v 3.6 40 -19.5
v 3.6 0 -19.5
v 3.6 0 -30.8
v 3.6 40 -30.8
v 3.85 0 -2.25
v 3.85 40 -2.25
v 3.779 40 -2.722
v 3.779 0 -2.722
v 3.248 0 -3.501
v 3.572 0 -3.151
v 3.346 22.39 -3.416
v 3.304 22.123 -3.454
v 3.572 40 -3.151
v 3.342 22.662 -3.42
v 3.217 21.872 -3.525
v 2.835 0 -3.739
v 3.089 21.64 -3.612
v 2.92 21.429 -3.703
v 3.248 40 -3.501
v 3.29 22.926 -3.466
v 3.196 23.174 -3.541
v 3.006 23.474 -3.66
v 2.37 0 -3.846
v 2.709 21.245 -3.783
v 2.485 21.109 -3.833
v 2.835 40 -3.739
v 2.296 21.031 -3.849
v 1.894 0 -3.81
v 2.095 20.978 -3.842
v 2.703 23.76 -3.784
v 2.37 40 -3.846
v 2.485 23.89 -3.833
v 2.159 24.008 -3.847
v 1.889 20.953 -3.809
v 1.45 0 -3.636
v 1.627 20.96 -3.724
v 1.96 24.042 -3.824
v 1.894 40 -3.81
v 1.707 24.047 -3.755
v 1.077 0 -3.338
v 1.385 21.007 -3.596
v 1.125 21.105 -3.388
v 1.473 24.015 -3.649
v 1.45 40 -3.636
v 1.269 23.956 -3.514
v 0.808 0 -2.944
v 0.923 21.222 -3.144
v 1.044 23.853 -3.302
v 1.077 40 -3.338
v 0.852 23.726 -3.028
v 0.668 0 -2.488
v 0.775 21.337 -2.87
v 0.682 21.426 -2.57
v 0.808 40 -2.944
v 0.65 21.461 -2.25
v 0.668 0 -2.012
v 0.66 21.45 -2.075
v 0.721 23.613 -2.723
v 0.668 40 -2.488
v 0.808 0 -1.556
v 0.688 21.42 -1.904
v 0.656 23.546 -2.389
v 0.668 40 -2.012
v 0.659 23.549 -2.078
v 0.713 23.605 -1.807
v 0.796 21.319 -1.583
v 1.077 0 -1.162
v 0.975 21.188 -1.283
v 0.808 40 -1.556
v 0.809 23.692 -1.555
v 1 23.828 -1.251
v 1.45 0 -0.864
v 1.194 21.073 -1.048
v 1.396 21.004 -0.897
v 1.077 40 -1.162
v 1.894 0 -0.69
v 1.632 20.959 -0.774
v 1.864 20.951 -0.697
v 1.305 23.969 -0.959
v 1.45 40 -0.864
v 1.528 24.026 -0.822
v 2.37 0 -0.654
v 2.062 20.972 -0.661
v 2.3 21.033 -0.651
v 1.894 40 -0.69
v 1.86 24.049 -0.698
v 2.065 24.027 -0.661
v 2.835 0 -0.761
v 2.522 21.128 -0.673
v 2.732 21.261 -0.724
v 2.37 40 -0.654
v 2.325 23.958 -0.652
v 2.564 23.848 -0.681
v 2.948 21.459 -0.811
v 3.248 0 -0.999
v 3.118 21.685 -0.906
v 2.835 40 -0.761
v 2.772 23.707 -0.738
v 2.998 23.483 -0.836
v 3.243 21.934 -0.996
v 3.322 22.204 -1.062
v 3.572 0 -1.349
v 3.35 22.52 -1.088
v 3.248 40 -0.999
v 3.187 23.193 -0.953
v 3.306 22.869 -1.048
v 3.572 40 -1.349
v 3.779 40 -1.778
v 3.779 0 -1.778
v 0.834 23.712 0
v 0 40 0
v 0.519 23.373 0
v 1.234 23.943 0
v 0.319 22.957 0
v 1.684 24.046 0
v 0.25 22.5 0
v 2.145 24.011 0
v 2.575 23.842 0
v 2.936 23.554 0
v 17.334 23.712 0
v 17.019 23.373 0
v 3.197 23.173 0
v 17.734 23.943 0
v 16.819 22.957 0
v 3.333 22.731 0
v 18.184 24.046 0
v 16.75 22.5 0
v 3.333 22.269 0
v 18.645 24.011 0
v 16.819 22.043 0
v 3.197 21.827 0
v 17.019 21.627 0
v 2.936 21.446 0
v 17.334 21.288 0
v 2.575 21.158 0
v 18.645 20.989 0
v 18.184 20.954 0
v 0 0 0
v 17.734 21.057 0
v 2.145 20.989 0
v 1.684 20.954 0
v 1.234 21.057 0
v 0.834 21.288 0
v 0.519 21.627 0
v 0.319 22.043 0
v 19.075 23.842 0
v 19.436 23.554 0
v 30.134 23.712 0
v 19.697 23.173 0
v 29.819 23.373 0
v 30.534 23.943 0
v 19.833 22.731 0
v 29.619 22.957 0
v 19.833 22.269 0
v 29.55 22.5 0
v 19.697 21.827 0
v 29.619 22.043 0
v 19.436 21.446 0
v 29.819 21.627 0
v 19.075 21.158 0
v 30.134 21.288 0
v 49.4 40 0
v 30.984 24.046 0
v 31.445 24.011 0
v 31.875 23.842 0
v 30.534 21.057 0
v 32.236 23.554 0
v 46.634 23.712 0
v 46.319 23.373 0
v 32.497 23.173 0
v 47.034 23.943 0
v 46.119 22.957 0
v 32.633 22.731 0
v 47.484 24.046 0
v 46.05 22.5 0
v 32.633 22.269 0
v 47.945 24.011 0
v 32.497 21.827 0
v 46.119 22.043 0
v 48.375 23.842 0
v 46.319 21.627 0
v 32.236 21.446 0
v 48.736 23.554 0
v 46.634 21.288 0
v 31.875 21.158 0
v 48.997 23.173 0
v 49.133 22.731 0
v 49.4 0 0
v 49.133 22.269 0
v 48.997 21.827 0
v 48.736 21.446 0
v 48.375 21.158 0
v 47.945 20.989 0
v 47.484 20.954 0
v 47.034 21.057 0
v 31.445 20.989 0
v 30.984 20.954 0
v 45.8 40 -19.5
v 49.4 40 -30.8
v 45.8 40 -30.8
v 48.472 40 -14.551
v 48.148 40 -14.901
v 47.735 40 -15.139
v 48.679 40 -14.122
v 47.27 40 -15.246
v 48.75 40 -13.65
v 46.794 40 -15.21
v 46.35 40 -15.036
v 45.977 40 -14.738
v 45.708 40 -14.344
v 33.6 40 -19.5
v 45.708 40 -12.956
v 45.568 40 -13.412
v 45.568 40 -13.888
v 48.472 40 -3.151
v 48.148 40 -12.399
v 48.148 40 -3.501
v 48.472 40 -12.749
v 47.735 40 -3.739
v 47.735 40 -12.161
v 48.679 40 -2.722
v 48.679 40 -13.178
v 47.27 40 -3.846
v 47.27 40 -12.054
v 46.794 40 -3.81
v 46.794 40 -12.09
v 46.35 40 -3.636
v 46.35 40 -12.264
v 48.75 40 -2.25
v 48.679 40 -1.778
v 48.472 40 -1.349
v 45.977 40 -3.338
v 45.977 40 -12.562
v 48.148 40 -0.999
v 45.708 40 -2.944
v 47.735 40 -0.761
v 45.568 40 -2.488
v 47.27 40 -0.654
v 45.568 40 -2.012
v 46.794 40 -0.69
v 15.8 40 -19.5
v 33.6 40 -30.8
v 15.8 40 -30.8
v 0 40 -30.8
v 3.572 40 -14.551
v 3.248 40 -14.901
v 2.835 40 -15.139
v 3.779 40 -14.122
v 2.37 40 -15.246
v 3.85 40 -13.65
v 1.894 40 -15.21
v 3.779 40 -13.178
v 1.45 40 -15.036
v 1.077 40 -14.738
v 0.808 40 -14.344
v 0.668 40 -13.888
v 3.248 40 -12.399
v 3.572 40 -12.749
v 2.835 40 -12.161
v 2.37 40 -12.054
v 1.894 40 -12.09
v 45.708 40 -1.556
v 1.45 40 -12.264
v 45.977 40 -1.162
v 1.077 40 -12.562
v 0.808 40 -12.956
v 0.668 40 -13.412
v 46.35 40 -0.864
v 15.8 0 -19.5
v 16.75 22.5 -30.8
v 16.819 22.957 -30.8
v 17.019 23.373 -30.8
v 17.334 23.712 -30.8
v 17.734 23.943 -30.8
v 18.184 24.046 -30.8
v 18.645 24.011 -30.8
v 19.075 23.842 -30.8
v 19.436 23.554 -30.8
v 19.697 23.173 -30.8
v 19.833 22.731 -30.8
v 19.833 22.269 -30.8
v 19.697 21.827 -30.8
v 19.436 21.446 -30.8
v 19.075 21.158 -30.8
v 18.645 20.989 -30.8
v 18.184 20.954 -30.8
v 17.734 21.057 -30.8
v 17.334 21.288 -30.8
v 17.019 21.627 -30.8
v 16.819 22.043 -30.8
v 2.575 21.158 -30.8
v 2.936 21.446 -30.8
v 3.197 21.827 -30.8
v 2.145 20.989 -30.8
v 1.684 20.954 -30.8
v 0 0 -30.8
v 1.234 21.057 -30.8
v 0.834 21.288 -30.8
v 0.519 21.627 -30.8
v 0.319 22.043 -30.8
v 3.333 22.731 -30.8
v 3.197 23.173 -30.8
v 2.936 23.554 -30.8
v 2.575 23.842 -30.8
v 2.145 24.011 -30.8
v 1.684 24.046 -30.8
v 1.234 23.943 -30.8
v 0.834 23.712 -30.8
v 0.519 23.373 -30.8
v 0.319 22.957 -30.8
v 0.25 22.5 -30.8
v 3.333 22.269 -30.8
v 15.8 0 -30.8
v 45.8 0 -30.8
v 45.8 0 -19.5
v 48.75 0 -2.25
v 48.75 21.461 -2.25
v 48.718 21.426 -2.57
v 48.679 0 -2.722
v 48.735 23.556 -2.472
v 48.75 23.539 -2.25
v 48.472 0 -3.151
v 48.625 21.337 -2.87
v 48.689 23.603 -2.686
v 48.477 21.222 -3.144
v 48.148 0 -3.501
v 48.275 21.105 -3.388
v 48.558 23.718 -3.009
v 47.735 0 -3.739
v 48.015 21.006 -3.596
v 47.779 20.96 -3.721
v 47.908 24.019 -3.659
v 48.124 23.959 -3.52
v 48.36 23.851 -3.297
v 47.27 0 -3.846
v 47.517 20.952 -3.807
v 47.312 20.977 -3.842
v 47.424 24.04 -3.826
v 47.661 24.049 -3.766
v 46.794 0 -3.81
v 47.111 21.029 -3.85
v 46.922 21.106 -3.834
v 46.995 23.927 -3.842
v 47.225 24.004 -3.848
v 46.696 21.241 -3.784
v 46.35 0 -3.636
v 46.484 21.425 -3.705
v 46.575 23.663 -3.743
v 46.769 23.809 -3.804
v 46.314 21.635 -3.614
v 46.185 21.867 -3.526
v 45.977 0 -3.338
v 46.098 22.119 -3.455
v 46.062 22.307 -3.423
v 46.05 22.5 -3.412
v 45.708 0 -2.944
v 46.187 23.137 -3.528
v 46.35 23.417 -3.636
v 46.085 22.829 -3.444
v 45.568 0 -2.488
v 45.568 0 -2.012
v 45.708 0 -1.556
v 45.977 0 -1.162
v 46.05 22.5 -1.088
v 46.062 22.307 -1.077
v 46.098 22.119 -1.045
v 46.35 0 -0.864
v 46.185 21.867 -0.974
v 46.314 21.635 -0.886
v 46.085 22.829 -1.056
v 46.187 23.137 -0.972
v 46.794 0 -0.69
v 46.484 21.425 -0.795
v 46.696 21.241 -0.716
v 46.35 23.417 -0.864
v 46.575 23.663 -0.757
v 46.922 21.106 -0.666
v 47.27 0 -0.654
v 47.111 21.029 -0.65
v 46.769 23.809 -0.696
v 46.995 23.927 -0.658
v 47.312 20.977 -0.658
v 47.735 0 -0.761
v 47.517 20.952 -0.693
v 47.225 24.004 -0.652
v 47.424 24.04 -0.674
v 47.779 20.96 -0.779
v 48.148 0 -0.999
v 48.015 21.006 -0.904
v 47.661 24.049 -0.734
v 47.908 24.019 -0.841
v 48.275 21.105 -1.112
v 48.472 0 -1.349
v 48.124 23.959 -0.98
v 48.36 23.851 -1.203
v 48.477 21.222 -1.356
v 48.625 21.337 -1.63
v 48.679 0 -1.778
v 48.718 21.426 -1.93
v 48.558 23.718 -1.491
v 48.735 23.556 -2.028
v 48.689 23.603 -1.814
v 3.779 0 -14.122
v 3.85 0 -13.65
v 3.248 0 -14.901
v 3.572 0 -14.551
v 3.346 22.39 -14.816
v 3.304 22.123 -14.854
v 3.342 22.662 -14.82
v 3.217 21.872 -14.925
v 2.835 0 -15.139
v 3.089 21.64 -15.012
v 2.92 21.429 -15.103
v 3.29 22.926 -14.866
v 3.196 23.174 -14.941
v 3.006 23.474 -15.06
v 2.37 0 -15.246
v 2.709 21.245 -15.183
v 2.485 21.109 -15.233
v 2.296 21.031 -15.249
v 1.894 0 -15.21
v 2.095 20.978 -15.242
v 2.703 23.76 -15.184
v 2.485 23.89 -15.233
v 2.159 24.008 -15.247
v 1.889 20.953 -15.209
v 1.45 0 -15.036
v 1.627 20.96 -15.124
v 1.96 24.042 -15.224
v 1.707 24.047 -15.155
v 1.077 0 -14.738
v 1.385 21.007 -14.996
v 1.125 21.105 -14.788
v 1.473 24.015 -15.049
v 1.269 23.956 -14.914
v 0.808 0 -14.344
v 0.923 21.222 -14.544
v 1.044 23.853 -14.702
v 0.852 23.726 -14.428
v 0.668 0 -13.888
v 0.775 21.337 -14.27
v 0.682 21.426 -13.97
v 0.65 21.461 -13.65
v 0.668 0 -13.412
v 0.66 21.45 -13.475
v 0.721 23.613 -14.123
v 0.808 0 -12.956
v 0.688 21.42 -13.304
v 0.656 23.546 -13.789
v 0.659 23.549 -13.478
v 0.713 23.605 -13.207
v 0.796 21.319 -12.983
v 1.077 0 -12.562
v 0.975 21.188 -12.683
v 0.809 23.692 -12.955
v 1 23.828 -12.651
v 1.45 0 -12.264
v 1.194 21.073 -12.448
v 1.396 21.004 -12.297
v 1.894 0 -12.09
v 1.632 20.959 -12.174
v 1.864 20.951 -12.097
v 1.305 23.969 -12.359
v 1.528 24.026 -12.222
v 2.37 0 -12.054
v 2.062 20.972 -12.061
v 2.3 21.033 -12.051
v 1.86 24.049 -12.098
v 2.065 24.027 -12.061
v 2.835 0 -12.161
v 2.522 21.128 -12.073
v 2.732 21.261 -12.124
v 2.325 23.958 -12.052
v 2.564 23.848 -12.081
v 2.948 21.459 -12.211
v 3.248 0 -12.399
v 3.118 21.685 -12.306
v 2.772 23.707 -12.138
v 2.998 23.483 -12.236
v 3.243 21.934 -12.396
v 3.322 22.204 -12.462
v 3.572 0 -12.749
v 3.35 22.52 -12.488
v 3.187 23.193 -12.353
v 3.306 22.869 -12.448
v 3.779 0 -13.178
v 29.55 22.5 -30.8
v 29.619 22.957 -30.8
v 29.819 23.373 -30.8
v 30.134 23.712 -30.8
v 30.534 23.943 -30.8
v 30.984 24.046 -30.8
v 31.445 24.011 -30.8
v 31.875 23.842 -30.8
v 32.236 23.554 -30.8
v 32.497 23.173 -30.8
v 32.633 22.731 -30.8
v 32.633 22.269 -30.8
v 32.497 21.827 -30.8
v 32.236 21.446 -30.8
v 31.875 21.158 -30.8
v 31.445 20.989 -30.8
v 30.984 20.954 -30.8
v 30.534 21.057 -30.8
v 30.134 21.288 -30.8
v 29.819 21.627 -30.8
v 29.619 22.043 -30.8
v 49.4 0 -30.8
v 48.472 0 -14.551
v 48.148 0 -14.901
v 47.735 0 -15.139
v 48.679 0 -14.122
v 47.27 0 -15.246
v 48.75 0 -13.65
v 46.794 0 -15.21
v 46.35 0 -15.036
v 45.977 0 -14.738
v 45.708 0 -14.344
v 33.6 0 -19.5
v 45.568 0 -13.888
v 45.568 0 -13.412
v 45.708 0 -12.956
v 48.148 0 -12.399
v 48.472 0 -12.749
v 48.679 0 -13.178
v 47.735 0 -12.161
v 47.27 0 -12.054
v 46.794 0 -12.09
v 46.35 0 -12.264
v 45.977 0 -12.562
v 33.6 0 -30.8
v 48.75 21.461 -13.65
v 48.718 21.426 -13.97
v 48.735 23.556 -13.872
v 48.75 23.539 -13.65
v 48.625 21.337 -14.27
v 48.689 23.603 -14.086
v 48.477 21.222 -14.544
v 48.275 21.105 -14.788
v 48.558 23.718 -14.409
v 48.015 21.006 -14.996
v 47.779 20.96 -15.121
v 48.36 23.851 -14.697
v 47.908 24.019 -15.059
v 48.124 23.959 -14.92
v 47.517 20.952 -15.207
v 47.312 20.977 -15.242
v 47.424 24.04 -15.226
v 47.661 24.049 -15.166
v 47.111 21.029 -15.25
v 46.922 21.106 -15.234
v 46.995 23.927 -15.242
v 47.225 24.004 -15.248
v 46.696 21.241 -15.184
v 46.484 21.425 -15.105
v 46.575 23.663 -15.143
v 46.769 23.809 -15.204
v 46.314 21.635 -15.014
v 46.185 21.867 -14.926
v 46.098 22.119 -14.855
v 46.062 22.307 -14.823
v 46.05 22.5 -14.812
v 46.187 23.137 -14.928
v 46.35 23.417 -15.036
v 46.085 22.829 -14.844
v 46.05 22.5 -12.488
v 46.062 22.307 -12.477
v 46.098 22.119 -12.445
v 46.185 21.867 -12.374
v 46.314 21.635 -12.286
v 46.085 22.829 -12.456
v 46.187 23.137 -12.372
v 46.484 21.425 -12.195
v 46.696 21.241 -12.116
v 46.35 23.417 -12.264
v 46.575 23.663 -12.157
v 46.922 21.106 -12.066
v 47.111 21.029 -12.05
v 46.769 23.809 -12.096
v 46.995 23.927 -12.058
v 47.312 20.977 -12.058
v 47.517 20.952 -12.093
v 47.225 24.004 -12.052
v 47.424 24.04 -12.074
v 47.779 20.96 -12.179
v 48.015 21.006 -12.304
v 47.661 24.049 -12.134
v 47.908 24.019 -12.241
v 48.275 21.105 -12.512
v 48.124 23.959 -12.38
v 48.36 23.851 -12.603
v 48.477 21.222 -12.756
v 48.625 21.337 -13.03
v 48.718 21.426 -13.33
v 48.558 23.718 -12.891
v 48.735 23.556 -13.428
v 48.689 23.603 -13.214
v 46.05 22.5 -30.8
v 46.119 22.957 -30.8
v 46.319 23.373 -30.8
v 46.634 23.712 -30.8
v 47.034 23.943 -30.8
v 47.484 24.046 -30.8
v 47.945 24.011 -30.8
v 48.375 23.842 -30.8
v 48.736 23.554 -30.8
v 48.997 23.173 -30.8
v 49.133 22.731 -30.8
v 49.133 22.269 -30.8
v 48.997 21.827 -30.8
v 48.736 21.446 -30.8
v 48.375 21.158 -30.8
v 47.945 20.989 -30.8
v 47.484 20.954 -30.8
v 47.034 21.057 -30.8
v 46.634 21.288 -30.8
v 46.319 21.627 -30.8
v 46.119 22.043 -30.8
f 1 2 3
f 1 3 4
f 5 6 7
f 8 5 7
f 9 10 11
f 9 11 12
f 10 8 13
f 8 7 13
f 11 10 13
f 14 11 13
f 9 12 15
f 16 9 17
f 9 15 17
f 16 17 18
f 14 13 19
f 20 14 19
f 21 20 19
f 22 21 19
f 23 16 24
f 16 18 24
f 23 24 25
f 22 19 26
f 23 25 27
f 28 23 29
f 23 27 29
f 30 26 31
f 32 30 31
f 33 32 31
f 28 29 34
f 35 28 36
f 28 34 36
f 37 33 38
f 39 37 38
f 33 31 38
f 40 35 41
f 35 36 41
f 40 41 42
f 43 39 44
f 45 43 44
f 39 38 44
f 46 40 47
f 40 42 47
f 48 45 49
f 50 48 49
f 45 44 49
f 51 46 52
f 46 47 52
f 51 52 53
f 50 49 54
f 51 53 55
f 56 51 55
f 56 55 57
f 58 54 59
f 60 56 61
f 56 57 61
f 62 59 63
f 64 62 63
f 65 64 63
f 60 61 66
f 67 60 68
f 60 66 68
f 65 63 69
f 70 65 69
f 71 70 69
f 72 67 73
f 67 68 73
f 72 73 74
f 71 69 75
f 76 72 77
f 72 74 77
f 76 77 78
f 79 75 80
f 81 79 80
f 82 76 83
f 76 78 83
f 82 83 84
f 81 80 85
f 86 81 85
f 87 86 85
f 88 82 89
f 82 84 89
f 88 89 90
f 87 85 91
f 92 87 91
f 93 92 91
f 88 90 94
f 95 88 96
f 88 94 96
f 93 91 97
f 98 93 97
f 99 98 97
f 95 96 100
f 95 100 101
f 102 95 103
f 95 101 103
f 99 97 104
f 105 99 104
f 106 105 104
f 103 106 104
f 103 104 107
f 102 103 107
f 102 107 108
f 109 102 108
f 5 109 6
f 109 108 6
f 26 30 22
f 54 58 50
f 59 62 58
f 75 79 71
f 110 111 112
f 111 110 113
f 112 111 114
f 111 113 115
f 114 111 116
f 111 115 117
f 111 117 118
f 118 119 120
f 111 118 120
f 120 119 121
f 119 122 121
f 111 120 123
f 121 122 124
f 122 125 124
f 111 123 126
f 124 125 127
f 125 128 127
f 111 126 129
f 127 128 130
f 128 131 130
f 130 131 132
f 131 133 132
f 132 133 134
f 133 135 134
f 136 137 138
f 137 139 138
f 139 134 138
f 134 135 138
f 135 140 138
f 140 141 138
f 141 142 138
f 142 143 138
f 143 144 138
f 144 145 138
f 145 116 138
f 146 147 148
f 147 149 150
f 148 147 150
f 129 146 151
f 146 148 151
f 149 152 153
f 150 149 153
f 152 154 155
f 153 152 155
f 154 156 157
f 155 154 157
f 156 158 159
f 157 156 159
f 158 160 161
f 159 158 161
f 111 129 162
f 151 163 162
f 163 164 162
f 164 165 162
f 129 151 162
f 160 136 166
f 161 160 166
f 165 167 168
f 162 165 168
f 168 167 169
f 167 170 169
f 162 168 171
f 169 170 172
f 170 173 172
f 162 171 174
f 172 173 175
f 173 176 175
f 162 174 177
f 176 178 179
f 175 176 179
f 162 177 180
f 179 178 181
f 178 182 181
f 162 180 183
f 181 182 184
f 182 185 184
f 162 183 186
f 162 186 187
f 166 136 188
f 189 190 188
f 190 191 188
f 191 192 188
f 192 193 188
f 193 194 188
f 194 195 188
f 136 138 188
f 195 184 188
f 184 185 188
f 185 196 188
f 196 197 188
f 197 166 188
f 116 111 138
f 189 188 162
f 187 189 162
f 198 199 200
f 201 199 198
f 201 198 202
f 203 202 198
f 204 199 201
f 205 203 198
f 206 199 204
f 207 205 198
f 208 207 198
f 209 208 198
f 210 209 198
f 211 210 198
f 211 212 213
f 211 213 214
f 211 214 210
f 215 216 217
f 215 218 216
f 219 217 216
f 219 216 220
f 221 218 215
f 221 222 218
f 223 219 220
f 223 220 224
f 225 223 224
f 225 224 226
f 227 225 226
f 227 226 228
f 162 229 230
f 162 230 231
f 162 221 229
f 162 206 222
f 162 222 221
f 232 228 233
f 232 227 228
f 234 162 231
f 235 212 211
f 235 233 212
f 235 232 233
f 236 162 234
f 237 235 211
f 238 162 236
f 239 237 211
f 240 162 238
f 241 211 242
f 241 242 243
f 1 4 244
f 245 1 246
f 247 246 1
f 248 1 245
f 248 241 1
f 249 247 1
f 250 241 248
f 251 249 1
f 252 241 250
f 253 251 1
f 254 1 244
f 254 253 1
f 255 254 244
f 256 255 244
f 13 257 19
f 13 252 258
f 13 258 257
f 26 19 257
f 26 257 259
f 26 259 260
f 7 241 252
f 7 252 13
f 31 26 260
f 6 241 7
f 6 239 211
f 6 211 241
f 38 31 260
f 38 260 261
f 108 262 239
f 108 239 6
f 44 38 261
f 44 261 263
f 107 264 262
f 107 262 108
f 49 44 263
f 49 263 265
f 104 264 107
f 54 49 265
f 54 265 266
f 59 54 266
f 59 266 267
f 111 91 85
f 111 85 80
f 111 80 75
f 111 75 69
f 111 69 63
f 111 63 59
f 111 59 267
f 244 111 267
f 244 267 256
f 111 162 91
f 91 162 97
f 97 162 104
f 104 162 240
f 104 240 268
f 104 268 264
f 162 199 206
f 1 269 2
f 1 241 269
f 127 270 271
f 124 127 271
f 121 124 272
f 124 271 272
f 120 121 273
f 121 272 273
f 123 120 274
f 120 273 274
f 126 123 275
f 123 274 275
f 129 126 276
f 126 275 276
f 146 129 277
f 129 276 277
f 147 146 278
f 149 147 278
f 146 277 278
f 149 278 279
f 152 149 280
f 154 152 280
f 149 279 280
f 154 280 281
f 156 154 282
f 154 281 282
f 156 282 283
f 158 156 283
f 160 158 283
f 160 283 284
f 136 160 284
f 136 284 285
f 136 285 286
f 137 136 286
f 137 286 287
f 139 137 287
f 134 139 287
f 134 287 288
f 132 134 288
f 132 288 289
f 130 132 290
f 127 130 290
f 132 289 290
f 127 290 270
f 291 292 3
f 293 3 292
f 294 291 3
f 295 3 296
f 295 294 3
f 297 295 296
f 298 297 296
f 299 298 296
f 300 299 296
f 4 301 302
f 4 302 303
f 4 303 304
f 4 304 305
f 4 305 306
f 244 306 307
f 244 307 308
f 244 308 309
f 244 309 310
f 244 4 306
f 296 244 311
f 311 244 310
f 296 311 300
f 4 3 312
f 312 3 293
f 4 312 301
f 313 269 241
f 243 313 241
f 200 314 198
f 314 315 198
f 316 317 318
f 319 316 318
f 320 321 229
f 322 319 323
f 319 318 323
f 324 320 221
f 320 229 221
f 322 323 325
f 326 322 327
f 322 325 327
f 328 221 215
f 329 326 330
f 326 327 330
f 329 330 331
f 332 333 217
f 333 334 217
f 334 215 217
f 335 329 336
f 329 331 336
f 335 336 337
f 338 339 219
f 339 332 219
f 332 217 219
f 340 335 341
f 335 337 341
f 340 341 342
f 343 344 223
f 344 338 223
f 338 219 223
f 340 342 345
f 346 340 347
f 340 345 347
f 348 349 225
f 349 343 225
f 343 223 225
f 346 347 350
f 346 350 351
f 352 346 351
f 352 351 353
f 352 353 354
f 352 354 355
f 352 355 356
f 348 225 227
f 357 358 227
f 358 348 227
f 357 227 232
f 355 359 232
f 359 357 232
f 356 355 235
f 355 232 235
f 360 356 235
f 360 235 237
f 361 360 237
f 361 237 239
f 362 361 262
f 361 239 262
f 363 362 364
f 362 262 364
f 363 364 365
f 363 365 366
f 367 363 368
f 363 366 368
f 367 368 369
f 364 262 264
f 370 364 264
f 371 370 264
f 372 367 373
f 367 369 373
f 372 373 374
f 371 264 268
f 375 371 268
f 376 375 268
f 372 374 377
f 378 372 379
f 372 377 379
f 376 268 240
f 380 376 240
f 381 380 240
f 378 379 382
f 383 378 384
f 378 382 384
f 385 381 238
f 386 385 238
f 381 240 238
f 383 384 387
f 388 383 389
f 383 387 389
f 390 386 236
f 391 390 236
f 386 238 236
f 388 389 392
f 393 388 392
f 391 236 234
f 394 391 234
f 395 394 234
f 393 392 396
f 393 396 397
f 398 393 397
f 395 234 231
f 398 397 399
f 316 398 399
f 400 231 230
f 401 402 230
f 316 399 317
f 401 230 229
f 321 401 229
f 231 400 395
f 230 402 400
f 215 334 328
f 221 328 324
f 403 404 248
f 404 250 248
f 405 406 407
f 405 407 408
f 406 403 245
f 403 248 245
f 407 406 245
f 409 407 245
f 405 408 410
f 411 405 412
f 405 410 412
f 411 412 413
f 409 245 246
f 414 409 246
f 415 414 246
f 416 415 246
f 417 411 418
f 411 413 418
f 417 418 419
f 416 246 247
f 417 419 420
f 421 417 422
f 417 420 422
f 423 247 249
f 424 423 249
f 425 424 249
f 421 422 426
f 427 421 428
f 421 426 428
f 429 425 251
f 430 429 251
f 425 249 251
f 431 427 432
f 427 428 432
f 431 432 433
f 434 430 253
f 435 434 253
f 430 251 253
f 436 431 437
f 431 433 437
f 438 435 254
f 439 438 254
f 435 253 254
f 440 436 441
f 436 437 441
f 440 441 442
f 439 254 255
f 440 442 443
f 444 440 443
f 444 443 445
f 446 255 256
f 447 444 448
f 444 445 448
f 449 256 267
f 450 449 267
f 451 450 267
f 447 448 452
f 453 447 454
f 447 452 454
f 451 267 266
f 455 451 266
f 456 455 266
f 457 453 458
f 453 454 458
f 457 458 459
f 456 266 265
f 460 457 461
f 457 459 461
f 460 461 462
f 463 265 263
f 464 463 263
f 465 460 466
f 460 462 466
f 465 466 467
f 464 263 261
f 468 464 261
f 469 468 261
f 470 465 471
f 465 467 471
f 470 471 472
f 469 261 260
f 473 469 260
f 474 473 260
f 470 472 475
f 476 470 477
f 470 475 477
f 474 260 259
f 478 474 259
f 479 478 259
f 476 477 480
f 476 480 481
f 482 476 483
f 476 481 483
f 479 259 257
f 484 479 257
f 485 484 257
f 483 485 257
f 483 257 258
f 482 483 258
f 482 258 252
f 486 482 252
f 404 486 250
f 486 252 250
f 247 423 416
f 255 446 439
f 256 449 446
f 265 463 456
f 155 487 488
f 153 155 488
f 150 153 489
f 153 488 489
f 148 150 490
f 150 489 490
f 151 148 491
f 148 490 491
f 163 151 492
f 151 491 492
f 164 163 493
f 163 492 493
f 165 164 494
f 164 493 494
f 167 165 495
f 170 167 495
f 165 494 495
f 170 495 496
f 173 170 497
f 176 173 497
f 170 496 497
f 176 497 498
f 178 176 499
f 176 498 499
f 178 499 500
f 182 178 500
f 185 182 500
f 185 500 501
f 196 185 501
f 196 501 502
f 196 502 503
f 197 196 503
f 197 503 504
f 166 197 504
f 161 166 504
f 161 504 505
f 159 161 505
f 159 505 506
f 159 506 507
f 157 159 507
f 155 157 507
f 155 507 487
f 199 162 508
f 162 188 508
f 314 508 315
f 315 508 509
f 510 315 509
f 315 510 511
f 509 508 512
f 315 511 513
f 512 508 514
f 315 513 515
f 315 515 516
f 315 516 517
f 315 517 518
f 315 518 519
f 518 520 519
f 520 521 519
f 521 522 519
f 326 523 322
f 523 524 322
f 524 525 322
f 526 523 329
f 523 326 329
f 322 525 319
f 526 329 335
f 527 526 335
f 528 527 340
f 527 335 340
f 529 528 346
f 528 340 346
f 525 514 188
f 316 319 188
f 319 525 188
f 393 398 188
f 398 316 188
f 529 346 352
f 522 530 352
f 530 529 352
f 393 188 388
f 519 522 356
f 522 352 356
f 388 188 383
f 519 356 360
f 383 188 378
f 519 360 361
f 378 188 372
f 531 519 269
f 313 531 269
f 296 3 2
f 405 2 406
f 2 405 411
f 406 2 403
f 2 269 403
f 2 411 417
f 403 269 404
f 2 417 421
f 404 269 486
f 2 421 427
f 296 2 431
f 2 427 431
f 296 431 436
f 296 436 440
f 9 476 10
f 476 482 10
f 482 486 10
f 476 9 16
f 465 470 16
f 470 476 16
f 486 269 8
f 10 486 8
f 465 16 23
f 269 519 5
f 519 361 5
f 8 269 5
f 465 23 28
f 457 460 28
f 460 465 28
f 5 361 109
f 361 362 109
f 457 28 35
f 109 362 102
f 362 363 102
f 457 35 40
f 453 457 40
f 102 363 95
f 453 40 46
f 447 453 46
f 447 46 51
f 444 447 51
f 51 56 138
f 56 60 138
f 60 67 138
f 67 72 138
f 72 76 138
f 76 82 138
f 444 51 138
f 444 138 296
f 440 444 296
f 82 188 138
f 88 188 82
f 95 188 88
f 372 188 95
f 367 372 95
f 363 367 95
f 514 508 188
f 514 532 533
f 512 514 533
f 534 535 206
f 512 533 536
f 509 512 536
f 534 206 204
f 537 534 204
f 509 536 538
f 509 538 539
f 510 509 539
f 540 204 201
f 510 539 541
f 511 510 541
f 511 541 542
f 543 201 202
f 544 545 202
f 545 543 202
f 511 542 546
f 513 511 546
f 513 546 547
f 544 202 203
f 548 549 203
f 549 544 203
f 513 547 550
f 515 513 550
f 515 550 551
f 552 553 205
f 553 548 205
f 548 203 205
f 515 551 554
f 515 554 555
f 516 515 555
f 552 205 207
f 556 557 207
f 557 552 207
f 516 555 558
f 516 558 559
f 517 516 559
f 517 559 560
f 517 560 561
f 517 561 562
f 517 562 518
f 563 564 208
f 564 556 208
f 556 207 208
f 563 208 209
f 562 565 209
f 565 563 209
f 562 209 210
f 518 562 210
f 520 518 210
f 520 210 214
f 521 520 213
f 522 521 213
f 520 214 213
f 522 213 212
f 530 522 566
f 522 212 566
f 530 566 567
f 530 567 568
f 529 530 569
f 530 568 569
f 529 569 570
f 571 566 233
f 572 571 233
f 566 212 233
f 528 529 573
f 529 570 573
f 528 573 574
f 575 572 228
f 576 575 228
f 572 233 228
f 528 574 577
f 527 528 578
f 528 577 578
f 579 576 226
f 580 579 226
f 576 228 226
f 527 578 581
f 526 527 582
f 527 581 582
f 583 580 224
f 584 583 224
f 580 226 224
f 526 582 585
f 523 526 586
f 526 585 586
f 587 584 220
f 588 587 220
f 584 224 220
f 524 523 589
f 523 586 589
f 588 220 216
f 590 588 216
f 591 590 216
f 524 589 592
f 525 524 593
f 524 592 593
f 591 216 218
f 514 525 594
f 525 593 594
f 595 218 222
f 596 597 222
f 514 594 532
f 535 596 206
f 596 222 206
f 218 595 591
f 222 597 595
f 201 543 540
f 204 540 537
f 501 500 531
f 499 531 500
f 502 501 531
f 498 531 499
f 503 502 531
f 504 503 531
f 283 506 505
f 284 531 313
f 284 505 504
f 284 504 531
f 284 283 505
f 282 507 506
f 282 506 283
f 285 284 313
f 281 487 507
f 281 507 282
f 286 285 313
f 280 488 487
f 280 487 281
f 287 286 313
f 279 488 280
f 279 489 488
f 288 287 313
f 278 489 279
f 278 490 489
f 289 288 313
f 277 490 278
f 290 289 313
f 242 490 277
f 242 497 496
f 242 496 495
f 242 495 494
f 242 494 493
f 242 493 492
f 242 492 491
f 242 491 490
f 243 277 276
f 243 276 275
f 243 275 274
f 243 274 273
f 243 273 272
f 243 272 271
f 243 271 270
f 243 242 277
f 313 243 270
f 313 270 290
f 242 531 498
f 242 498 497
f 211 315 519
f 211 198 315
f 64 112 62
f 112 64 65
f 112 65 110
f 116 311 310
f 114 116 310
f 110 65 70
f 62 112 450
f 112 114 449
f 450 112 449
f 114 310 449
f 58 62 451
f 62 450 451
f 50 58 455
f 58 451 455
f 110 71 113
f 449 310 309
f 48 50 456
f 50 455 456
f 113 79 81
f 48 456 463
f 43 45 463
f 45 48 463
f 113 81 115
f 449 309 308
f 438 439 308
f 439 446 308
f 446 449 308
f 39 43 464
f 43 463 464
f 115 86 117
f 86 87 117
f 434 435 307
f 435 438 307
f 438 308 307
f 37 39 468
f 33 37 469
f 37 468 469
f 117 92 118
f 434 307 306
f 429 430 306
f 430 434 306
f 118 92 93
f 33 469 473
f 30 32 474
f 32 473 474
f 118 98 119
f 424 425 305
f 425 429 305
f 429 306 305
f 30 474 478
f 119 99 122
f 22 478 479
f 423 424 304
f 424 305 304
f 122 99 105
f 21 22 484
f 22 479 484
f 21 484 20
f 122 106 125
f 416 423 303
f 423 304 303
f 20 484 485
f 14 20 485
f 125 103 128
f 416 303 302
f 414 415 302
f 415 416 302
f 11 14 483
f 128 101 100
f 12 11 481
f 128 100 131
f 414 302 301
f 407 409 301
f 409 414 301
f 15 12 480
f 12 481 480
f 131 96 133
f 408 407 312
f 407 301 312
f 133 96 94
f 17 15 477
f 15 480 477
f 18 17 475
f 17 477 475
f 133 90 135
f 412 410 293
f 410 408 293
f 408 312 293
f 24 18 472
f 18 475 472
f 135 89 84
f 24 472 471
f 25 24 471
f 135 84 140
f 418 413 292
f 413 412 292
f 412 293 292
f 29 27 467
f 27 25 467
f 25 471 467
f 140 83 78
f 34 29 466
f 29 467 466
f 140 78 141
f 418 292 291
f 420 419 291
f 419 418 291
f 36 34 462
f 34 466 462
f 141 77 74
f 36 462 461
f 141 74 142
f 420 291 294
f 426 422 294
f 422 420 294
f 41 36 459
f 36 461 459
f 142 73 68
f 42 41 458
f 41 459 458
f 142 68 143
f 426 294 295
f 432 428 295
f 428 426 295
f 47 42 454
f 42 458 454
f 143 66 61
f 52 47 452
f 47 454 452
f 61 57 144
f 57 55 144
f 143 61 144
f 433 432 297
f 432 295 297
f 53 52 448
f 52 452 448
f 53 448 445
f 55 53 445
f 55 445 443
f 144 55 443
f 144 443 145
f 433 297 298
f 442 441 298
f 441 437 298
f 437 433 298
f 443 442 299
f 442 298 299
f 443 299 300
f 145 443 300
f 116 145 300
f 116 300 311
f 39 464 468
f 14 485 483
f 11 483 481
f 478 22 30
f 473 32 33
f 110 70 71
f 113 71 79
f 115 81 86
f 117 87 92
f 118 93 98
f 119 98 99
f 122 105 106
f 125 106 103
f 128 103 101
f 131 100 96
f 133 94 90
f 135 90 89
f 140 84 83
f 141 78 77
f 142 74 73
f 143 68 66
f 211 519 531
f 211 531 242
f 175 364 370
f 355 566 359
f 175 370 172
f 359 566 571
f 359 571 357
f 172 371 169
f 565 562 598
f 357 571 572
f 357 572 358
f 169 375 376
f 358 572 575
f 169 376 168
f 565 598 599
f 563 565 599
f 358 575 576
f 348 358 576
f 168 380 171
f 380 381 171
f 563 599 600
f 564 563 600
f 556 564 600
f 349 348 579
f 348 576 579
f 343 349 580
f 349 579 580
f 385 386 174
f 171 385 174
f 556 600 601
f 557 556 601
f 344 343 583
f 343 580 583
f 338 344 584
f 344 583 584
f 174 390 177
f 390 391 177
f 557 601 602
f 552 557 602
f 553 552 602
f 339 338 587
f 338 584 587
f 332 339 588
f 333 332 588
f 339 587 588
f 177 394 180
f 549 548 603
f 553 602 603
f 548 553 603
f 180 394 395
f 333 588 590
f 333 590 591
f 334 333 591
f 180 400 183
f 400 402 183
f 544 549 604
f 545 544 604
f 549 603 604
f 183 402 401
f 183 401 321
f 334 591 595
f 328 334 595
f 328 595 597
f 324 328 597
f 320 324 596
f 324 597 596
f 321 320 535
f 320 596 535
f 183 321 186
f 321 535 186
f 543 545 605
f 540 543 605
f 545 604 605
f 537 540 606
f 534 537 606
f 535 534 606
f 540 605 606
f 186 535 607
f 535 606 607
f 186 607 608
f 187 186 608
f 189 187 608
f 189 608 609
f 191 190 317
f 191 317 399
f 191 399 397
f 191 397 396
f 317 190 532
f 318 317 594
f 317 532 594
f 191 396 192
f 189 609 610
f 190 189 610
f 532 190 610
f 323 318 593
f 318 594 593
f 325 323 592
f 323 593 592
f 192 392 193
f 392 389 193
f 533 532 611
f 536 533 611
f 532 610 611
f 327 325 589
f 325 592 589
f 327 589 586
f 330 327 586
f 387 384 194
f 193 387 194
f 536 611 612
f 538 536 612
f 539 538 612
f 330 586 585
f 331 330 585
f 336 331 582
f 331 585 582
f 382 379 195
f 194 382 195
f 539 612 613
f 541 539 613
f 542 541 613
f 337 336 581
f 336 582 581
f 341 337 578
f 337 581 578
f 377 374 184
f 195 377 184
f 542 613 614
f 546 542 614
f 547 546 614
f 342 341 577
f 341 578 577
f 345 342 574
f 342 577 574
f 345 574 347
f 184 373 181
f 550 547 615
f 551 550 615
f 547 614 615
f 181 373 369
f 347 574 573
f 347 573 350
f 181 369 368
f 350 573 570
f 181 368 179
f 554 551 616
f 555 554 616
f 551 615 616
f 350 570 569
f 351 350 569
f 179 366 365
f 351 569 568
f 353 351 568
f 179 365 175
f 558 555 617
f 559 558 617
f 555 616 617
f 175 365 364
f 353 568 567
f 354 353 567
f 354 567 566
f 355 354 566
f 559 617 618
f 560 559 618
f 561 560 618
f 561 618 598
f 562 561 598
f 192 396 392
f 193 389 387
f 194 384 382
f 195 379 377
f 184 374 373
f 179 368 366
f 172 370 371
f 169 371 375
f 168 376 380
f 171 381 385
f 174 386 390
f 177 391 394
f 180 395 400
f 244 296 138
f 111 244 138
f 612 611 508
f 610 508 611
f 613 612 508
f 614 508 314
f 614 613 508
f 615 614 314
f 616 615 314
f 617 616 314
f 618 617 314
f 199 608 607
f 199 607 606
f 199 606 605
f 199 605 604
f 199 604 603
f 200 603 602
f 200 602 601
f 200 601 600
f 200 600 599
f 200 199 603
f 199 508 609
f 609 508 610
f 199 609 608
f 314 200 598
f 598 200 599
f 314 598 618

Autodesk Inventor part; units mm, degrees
ref_plane "YZ Plane" through (0, 0, 0) normal (1, 0, 0) x (0, 1, 0)
ref_plane "XZ Plane" through (0, 0, 0) normal (0, 1, 0) x (-1, 0, 0)
ref_plane "XY Plane" through (0, 0, 0) normal (0, 0, 1) x (1, 0, 0)
sketch "Esboço1" plane through (0, 0, 0) normal (0, 1, 0) x (-1, 0, 0)
  line L0 (0, 0) -> (-49.4, 0)
  line L1 (-49.4, 0) -> (-49.4, -15.9)
  line L2 (-49.4, -15.9) -> (0, -15.9)
  line L3 (0, -15.9) -> (0, 0)
  dimension "d0" = 49.4
  dimension "d1" = 15.9
extrude "Extrusão1" add sketch "Esboço1" along normal blind 40
sketch "Esboço2" plane through (0, 40, 0) normal (0, 1, 0) x (1, 0, 0)
  line L0 (49.4, 15.9) -> (0, 15.9) projected
  line L1 (0, 15.9) -> (4.5, 15.9)
  line L2 (4.5, 15.9) -> (4.5, 11.4)
  line L3 (4.5, 11.4) -> (0, 11.4)
  line L4 (0, 11.4) -> (0, 15.9)
  line L5 (0, 0) -> (49.4, 0) projected
  line L6 (0, 0) -> (4.5, 0)
  line L7 (4.5, 0) -> (4.5, 4.5)
  line L8 (4.5, 4.5) -> (0, 4.5)
  line L9 (0, 4.5) -> (0, 0)
  line L10 (49.4, 0) -> (49.4, 15.9) projected
  line L11 (49.4, 15.9) -> (44.9, 15.9)
  line L12 (44.9, 15.9) -> (44.9, 11.4)
  line L13 (44.9, 11.4) -> (49.4, 11.4)
  line L14 (49.4, 11.4) -> (49.4, 15.9)
  line L15 (49.4, 0) -> (44.9, 0)
  line L16 (44.9, 0) -> (44.9, 4.5)
  line L17 (44.9, 4.5) -> (49.4, 4.5)
  line L18 (49.4, 4.5) -> (49.4, 0)
  line L19 (2.25, 15.9) -> (2.25, 11.4)
  line L20 (2.25, 4.5) -> (2.25, 0)
  line L21 (47.15, 15.9) -> (47.15, 11.4)
  line L22 (47.15, 4.5) -> (47.15, 0)
  circle A0 centre (2.25, 13.65) radius 1.6
  circle A1 centre (2.25, 2.25) radius 1.6
  circle A2 centre (47.15, 13.65) radius 1.6
  circle A3 centre (47.15, 2.25) radius 1.6
  dimension "d4" = 4.5
  dimension "d5" = 4.5
  dimension "d6" = 4.5
  dimension "d7" = 4.5
  dimension "d8" = 4.5
  dimension "d9" = 4.5
  dimension "d10" = 4.5
  dimension "d11" = 4.5
  dimension "d12" = 3.2
  dimension "d13" = 3.2
  dimension "d14" = 3.2
  dimension "d15" = 3.2
extrude "Extrusão2" cut sketch "Esboço2" against normal blind 40 contours A2 L21 | L21 A2 | A3 L22 | L22 A3 | A0 L19 | L19 A0 | A1 L20 | L20 A1
sketch "Esboço3" plane through (49.4, 0, -15.9) normal (0, 0, -1) x (-1, 0, 0)
  line L0 (49.4, 40) -> (0, 40) projected
  line L1 (49.4, 0) -> (33.6, 0)
  line L2 (33.6, 0) -> (33.6, 40)
  line L3 (33.6, 40) -> (49.4, 40)
  line L4 (49.4, 40) -> (49.4, 0)
  line L5 (0, 0) -> (15.8, 0)
  line L6 (15.8, 0) -> (15.8, 40)
  line L7 (15.8, 40) -> (0, 40)
  line L8 (0, 40) -> (0, 0)
  line L9 (33.6, 0) -> (15.8, 0)
  line L10 (15.8, 0) -> (15.8, 40)
  line L11 (15.8, 40) -> (33.6, 40)
  line L12 (33.6, 40) -> (33.6, 0)
  line L13 (49.4, 0) -> (45.8, 0)
  line L14 (45.8, 0) -> (45.8, 40)
  line L15 (45.8, 40) -> (49.4, 40)
  line L16 (49.4, 40) -> (49.4, 0)
  line L17 (0, 0) -> (3.6, 0)
  line L18 (3.6, 0) -> (3.6, 40)
  line L19 (3.6, 40) -> (0, 40)
  line L20 (0, 40) -> (0, 0)
  point P0 (3.6, 0)
  point P1 (3.6, 40)
  dimension "d18" = 15.8
  dimension "d19" = 15.8
  dimension "d24" = 3.6
  dimension "d25" = 3.6
extrude "Extrusão3" add sketch "Esboço3" along normal blind 14.9 contours L2 L9 L6 L0
extrude "Extrusão4" add sketch "Esboço3" along normal blind 3.6 contours L4 L1 L14 L0 | L14 L1 L2 L0 | L6 L5 L18 L0 | L18 L5 L8 L0
extrude "Extrusão5" add sketch "Esboço3" along normal blind 14.9 contours L4 L1 L14 L0 | L18 L5 L8 L0
sketch "Esboço4" plane through (49.4, 0, -30.8) normal (0, 0, -1) x (-1, 0, 0)
  point P0 (49.4, 0)
sketch "Esboço5" plane through (49.4, 0, -30.8) normal (0, 0, -1) x (-1, 0, 0)
  line L0 (15.8, 40) -> (15.8, 0) projected
  line L1 (33.6, 0) -> (33.6, 40) projected
  line L2 (15.8, 40) -> (33.6, 40)
  line L3 (33.6, 40) -> (33.6, 20)
  line L4 (33.6, 20) -> (15.8, 20)
  line L5 (15.8, 20) -> (15.8, 40)
  line L6 (15.8, 20) -> (33.6, 20)
  line L7 (33.6, 20) -> (33.6, 0)
  line L8 (33.6, 0) -> (15.8, 0)
  line L9 (15.8, 0) -> (15.8, 20)
  line L10 (15.8, 20) -> (33.6, 20)
  line L11 (33.6, 20) -> (33.6, 25)
  line L12 (33.6, 25) -> (15.8, 25)
  line L13 (15.8, 25) -> (15.8, 20)
  line L14 (15.8, 20) -> (20.8, 20)
  line L15 (20.8, 20) -> (20.8, 25)
  line L16 (20.8, 25) -> (15.8, 25)
  line L17 (15.8, 25) -> (15.8, 20)
  line L18 (33.6, 20) -> (28.6, 20)
  line L19 (28.6, 20) -> (28.6, 25)
  line L20 (28.6, 25) -> (33.6, 25)
  line L21 (33.6, 25) -> (33.6, 20)
  line L22 (18.3, 25) -> (18.3, 20)
  circle A0 centre (18.3, 22.5) radius 1.55
  line L23 (31.1, 25) -> (31.1, 20)
  circle A1 centre (31.1, 22.5) radius 1.55
  line L24 (0, 40) -> (0, 0) projected
  line L25 (15.8, 25) -> (0, 25)
  line L26 (0, 25) -> (0, 20)
  line L27 (0, 20) -> (15.8, 20)
  line L28 (15.8, 20) -> (15.8, 25)
  line L29 (33.6, 25) -> (49.4, 25)
  line L30 (49.4, 25) -> (49.4, 20)
  line L31 (49.4, 20) -> (33.6, 20)
  line L32 (33.6, 20) -> (33.6, 25)
  line L33 (0, 22.5) -> (3.6, 22.5)
  line L34 (3.6, 40) -> (3.6, 0) projected
  line L35 (49.4, 22.5) -> (45.8, 22.5)
  line L36 (45.8, 0) -> (45.8, 40) projected
  circle A2 centre (1.8, 22.5) radius 1.55
  circle A3 centre (47.6, 22.5) radius 1.55
  point P0 (49.4, 0)
  dimension "d28" = 20
  dimension "d29" = 5
  dimension "d30" = 5
  dimension "d31" = 5
  dimension "d32" = 5
  dimension "d33" = 3.1
  dimension "d34" = 3.1
  dimension "d35" = 3.1
  dimension "d36" = 3.1
extrude "Extrusão6" cut sketch "Esboço5" against normal through all contours A0 L22 | L22 A0 | A2 L33 | L33 A2 | A1 L23 | L23 A1 | A3 L35 | L35 A3
